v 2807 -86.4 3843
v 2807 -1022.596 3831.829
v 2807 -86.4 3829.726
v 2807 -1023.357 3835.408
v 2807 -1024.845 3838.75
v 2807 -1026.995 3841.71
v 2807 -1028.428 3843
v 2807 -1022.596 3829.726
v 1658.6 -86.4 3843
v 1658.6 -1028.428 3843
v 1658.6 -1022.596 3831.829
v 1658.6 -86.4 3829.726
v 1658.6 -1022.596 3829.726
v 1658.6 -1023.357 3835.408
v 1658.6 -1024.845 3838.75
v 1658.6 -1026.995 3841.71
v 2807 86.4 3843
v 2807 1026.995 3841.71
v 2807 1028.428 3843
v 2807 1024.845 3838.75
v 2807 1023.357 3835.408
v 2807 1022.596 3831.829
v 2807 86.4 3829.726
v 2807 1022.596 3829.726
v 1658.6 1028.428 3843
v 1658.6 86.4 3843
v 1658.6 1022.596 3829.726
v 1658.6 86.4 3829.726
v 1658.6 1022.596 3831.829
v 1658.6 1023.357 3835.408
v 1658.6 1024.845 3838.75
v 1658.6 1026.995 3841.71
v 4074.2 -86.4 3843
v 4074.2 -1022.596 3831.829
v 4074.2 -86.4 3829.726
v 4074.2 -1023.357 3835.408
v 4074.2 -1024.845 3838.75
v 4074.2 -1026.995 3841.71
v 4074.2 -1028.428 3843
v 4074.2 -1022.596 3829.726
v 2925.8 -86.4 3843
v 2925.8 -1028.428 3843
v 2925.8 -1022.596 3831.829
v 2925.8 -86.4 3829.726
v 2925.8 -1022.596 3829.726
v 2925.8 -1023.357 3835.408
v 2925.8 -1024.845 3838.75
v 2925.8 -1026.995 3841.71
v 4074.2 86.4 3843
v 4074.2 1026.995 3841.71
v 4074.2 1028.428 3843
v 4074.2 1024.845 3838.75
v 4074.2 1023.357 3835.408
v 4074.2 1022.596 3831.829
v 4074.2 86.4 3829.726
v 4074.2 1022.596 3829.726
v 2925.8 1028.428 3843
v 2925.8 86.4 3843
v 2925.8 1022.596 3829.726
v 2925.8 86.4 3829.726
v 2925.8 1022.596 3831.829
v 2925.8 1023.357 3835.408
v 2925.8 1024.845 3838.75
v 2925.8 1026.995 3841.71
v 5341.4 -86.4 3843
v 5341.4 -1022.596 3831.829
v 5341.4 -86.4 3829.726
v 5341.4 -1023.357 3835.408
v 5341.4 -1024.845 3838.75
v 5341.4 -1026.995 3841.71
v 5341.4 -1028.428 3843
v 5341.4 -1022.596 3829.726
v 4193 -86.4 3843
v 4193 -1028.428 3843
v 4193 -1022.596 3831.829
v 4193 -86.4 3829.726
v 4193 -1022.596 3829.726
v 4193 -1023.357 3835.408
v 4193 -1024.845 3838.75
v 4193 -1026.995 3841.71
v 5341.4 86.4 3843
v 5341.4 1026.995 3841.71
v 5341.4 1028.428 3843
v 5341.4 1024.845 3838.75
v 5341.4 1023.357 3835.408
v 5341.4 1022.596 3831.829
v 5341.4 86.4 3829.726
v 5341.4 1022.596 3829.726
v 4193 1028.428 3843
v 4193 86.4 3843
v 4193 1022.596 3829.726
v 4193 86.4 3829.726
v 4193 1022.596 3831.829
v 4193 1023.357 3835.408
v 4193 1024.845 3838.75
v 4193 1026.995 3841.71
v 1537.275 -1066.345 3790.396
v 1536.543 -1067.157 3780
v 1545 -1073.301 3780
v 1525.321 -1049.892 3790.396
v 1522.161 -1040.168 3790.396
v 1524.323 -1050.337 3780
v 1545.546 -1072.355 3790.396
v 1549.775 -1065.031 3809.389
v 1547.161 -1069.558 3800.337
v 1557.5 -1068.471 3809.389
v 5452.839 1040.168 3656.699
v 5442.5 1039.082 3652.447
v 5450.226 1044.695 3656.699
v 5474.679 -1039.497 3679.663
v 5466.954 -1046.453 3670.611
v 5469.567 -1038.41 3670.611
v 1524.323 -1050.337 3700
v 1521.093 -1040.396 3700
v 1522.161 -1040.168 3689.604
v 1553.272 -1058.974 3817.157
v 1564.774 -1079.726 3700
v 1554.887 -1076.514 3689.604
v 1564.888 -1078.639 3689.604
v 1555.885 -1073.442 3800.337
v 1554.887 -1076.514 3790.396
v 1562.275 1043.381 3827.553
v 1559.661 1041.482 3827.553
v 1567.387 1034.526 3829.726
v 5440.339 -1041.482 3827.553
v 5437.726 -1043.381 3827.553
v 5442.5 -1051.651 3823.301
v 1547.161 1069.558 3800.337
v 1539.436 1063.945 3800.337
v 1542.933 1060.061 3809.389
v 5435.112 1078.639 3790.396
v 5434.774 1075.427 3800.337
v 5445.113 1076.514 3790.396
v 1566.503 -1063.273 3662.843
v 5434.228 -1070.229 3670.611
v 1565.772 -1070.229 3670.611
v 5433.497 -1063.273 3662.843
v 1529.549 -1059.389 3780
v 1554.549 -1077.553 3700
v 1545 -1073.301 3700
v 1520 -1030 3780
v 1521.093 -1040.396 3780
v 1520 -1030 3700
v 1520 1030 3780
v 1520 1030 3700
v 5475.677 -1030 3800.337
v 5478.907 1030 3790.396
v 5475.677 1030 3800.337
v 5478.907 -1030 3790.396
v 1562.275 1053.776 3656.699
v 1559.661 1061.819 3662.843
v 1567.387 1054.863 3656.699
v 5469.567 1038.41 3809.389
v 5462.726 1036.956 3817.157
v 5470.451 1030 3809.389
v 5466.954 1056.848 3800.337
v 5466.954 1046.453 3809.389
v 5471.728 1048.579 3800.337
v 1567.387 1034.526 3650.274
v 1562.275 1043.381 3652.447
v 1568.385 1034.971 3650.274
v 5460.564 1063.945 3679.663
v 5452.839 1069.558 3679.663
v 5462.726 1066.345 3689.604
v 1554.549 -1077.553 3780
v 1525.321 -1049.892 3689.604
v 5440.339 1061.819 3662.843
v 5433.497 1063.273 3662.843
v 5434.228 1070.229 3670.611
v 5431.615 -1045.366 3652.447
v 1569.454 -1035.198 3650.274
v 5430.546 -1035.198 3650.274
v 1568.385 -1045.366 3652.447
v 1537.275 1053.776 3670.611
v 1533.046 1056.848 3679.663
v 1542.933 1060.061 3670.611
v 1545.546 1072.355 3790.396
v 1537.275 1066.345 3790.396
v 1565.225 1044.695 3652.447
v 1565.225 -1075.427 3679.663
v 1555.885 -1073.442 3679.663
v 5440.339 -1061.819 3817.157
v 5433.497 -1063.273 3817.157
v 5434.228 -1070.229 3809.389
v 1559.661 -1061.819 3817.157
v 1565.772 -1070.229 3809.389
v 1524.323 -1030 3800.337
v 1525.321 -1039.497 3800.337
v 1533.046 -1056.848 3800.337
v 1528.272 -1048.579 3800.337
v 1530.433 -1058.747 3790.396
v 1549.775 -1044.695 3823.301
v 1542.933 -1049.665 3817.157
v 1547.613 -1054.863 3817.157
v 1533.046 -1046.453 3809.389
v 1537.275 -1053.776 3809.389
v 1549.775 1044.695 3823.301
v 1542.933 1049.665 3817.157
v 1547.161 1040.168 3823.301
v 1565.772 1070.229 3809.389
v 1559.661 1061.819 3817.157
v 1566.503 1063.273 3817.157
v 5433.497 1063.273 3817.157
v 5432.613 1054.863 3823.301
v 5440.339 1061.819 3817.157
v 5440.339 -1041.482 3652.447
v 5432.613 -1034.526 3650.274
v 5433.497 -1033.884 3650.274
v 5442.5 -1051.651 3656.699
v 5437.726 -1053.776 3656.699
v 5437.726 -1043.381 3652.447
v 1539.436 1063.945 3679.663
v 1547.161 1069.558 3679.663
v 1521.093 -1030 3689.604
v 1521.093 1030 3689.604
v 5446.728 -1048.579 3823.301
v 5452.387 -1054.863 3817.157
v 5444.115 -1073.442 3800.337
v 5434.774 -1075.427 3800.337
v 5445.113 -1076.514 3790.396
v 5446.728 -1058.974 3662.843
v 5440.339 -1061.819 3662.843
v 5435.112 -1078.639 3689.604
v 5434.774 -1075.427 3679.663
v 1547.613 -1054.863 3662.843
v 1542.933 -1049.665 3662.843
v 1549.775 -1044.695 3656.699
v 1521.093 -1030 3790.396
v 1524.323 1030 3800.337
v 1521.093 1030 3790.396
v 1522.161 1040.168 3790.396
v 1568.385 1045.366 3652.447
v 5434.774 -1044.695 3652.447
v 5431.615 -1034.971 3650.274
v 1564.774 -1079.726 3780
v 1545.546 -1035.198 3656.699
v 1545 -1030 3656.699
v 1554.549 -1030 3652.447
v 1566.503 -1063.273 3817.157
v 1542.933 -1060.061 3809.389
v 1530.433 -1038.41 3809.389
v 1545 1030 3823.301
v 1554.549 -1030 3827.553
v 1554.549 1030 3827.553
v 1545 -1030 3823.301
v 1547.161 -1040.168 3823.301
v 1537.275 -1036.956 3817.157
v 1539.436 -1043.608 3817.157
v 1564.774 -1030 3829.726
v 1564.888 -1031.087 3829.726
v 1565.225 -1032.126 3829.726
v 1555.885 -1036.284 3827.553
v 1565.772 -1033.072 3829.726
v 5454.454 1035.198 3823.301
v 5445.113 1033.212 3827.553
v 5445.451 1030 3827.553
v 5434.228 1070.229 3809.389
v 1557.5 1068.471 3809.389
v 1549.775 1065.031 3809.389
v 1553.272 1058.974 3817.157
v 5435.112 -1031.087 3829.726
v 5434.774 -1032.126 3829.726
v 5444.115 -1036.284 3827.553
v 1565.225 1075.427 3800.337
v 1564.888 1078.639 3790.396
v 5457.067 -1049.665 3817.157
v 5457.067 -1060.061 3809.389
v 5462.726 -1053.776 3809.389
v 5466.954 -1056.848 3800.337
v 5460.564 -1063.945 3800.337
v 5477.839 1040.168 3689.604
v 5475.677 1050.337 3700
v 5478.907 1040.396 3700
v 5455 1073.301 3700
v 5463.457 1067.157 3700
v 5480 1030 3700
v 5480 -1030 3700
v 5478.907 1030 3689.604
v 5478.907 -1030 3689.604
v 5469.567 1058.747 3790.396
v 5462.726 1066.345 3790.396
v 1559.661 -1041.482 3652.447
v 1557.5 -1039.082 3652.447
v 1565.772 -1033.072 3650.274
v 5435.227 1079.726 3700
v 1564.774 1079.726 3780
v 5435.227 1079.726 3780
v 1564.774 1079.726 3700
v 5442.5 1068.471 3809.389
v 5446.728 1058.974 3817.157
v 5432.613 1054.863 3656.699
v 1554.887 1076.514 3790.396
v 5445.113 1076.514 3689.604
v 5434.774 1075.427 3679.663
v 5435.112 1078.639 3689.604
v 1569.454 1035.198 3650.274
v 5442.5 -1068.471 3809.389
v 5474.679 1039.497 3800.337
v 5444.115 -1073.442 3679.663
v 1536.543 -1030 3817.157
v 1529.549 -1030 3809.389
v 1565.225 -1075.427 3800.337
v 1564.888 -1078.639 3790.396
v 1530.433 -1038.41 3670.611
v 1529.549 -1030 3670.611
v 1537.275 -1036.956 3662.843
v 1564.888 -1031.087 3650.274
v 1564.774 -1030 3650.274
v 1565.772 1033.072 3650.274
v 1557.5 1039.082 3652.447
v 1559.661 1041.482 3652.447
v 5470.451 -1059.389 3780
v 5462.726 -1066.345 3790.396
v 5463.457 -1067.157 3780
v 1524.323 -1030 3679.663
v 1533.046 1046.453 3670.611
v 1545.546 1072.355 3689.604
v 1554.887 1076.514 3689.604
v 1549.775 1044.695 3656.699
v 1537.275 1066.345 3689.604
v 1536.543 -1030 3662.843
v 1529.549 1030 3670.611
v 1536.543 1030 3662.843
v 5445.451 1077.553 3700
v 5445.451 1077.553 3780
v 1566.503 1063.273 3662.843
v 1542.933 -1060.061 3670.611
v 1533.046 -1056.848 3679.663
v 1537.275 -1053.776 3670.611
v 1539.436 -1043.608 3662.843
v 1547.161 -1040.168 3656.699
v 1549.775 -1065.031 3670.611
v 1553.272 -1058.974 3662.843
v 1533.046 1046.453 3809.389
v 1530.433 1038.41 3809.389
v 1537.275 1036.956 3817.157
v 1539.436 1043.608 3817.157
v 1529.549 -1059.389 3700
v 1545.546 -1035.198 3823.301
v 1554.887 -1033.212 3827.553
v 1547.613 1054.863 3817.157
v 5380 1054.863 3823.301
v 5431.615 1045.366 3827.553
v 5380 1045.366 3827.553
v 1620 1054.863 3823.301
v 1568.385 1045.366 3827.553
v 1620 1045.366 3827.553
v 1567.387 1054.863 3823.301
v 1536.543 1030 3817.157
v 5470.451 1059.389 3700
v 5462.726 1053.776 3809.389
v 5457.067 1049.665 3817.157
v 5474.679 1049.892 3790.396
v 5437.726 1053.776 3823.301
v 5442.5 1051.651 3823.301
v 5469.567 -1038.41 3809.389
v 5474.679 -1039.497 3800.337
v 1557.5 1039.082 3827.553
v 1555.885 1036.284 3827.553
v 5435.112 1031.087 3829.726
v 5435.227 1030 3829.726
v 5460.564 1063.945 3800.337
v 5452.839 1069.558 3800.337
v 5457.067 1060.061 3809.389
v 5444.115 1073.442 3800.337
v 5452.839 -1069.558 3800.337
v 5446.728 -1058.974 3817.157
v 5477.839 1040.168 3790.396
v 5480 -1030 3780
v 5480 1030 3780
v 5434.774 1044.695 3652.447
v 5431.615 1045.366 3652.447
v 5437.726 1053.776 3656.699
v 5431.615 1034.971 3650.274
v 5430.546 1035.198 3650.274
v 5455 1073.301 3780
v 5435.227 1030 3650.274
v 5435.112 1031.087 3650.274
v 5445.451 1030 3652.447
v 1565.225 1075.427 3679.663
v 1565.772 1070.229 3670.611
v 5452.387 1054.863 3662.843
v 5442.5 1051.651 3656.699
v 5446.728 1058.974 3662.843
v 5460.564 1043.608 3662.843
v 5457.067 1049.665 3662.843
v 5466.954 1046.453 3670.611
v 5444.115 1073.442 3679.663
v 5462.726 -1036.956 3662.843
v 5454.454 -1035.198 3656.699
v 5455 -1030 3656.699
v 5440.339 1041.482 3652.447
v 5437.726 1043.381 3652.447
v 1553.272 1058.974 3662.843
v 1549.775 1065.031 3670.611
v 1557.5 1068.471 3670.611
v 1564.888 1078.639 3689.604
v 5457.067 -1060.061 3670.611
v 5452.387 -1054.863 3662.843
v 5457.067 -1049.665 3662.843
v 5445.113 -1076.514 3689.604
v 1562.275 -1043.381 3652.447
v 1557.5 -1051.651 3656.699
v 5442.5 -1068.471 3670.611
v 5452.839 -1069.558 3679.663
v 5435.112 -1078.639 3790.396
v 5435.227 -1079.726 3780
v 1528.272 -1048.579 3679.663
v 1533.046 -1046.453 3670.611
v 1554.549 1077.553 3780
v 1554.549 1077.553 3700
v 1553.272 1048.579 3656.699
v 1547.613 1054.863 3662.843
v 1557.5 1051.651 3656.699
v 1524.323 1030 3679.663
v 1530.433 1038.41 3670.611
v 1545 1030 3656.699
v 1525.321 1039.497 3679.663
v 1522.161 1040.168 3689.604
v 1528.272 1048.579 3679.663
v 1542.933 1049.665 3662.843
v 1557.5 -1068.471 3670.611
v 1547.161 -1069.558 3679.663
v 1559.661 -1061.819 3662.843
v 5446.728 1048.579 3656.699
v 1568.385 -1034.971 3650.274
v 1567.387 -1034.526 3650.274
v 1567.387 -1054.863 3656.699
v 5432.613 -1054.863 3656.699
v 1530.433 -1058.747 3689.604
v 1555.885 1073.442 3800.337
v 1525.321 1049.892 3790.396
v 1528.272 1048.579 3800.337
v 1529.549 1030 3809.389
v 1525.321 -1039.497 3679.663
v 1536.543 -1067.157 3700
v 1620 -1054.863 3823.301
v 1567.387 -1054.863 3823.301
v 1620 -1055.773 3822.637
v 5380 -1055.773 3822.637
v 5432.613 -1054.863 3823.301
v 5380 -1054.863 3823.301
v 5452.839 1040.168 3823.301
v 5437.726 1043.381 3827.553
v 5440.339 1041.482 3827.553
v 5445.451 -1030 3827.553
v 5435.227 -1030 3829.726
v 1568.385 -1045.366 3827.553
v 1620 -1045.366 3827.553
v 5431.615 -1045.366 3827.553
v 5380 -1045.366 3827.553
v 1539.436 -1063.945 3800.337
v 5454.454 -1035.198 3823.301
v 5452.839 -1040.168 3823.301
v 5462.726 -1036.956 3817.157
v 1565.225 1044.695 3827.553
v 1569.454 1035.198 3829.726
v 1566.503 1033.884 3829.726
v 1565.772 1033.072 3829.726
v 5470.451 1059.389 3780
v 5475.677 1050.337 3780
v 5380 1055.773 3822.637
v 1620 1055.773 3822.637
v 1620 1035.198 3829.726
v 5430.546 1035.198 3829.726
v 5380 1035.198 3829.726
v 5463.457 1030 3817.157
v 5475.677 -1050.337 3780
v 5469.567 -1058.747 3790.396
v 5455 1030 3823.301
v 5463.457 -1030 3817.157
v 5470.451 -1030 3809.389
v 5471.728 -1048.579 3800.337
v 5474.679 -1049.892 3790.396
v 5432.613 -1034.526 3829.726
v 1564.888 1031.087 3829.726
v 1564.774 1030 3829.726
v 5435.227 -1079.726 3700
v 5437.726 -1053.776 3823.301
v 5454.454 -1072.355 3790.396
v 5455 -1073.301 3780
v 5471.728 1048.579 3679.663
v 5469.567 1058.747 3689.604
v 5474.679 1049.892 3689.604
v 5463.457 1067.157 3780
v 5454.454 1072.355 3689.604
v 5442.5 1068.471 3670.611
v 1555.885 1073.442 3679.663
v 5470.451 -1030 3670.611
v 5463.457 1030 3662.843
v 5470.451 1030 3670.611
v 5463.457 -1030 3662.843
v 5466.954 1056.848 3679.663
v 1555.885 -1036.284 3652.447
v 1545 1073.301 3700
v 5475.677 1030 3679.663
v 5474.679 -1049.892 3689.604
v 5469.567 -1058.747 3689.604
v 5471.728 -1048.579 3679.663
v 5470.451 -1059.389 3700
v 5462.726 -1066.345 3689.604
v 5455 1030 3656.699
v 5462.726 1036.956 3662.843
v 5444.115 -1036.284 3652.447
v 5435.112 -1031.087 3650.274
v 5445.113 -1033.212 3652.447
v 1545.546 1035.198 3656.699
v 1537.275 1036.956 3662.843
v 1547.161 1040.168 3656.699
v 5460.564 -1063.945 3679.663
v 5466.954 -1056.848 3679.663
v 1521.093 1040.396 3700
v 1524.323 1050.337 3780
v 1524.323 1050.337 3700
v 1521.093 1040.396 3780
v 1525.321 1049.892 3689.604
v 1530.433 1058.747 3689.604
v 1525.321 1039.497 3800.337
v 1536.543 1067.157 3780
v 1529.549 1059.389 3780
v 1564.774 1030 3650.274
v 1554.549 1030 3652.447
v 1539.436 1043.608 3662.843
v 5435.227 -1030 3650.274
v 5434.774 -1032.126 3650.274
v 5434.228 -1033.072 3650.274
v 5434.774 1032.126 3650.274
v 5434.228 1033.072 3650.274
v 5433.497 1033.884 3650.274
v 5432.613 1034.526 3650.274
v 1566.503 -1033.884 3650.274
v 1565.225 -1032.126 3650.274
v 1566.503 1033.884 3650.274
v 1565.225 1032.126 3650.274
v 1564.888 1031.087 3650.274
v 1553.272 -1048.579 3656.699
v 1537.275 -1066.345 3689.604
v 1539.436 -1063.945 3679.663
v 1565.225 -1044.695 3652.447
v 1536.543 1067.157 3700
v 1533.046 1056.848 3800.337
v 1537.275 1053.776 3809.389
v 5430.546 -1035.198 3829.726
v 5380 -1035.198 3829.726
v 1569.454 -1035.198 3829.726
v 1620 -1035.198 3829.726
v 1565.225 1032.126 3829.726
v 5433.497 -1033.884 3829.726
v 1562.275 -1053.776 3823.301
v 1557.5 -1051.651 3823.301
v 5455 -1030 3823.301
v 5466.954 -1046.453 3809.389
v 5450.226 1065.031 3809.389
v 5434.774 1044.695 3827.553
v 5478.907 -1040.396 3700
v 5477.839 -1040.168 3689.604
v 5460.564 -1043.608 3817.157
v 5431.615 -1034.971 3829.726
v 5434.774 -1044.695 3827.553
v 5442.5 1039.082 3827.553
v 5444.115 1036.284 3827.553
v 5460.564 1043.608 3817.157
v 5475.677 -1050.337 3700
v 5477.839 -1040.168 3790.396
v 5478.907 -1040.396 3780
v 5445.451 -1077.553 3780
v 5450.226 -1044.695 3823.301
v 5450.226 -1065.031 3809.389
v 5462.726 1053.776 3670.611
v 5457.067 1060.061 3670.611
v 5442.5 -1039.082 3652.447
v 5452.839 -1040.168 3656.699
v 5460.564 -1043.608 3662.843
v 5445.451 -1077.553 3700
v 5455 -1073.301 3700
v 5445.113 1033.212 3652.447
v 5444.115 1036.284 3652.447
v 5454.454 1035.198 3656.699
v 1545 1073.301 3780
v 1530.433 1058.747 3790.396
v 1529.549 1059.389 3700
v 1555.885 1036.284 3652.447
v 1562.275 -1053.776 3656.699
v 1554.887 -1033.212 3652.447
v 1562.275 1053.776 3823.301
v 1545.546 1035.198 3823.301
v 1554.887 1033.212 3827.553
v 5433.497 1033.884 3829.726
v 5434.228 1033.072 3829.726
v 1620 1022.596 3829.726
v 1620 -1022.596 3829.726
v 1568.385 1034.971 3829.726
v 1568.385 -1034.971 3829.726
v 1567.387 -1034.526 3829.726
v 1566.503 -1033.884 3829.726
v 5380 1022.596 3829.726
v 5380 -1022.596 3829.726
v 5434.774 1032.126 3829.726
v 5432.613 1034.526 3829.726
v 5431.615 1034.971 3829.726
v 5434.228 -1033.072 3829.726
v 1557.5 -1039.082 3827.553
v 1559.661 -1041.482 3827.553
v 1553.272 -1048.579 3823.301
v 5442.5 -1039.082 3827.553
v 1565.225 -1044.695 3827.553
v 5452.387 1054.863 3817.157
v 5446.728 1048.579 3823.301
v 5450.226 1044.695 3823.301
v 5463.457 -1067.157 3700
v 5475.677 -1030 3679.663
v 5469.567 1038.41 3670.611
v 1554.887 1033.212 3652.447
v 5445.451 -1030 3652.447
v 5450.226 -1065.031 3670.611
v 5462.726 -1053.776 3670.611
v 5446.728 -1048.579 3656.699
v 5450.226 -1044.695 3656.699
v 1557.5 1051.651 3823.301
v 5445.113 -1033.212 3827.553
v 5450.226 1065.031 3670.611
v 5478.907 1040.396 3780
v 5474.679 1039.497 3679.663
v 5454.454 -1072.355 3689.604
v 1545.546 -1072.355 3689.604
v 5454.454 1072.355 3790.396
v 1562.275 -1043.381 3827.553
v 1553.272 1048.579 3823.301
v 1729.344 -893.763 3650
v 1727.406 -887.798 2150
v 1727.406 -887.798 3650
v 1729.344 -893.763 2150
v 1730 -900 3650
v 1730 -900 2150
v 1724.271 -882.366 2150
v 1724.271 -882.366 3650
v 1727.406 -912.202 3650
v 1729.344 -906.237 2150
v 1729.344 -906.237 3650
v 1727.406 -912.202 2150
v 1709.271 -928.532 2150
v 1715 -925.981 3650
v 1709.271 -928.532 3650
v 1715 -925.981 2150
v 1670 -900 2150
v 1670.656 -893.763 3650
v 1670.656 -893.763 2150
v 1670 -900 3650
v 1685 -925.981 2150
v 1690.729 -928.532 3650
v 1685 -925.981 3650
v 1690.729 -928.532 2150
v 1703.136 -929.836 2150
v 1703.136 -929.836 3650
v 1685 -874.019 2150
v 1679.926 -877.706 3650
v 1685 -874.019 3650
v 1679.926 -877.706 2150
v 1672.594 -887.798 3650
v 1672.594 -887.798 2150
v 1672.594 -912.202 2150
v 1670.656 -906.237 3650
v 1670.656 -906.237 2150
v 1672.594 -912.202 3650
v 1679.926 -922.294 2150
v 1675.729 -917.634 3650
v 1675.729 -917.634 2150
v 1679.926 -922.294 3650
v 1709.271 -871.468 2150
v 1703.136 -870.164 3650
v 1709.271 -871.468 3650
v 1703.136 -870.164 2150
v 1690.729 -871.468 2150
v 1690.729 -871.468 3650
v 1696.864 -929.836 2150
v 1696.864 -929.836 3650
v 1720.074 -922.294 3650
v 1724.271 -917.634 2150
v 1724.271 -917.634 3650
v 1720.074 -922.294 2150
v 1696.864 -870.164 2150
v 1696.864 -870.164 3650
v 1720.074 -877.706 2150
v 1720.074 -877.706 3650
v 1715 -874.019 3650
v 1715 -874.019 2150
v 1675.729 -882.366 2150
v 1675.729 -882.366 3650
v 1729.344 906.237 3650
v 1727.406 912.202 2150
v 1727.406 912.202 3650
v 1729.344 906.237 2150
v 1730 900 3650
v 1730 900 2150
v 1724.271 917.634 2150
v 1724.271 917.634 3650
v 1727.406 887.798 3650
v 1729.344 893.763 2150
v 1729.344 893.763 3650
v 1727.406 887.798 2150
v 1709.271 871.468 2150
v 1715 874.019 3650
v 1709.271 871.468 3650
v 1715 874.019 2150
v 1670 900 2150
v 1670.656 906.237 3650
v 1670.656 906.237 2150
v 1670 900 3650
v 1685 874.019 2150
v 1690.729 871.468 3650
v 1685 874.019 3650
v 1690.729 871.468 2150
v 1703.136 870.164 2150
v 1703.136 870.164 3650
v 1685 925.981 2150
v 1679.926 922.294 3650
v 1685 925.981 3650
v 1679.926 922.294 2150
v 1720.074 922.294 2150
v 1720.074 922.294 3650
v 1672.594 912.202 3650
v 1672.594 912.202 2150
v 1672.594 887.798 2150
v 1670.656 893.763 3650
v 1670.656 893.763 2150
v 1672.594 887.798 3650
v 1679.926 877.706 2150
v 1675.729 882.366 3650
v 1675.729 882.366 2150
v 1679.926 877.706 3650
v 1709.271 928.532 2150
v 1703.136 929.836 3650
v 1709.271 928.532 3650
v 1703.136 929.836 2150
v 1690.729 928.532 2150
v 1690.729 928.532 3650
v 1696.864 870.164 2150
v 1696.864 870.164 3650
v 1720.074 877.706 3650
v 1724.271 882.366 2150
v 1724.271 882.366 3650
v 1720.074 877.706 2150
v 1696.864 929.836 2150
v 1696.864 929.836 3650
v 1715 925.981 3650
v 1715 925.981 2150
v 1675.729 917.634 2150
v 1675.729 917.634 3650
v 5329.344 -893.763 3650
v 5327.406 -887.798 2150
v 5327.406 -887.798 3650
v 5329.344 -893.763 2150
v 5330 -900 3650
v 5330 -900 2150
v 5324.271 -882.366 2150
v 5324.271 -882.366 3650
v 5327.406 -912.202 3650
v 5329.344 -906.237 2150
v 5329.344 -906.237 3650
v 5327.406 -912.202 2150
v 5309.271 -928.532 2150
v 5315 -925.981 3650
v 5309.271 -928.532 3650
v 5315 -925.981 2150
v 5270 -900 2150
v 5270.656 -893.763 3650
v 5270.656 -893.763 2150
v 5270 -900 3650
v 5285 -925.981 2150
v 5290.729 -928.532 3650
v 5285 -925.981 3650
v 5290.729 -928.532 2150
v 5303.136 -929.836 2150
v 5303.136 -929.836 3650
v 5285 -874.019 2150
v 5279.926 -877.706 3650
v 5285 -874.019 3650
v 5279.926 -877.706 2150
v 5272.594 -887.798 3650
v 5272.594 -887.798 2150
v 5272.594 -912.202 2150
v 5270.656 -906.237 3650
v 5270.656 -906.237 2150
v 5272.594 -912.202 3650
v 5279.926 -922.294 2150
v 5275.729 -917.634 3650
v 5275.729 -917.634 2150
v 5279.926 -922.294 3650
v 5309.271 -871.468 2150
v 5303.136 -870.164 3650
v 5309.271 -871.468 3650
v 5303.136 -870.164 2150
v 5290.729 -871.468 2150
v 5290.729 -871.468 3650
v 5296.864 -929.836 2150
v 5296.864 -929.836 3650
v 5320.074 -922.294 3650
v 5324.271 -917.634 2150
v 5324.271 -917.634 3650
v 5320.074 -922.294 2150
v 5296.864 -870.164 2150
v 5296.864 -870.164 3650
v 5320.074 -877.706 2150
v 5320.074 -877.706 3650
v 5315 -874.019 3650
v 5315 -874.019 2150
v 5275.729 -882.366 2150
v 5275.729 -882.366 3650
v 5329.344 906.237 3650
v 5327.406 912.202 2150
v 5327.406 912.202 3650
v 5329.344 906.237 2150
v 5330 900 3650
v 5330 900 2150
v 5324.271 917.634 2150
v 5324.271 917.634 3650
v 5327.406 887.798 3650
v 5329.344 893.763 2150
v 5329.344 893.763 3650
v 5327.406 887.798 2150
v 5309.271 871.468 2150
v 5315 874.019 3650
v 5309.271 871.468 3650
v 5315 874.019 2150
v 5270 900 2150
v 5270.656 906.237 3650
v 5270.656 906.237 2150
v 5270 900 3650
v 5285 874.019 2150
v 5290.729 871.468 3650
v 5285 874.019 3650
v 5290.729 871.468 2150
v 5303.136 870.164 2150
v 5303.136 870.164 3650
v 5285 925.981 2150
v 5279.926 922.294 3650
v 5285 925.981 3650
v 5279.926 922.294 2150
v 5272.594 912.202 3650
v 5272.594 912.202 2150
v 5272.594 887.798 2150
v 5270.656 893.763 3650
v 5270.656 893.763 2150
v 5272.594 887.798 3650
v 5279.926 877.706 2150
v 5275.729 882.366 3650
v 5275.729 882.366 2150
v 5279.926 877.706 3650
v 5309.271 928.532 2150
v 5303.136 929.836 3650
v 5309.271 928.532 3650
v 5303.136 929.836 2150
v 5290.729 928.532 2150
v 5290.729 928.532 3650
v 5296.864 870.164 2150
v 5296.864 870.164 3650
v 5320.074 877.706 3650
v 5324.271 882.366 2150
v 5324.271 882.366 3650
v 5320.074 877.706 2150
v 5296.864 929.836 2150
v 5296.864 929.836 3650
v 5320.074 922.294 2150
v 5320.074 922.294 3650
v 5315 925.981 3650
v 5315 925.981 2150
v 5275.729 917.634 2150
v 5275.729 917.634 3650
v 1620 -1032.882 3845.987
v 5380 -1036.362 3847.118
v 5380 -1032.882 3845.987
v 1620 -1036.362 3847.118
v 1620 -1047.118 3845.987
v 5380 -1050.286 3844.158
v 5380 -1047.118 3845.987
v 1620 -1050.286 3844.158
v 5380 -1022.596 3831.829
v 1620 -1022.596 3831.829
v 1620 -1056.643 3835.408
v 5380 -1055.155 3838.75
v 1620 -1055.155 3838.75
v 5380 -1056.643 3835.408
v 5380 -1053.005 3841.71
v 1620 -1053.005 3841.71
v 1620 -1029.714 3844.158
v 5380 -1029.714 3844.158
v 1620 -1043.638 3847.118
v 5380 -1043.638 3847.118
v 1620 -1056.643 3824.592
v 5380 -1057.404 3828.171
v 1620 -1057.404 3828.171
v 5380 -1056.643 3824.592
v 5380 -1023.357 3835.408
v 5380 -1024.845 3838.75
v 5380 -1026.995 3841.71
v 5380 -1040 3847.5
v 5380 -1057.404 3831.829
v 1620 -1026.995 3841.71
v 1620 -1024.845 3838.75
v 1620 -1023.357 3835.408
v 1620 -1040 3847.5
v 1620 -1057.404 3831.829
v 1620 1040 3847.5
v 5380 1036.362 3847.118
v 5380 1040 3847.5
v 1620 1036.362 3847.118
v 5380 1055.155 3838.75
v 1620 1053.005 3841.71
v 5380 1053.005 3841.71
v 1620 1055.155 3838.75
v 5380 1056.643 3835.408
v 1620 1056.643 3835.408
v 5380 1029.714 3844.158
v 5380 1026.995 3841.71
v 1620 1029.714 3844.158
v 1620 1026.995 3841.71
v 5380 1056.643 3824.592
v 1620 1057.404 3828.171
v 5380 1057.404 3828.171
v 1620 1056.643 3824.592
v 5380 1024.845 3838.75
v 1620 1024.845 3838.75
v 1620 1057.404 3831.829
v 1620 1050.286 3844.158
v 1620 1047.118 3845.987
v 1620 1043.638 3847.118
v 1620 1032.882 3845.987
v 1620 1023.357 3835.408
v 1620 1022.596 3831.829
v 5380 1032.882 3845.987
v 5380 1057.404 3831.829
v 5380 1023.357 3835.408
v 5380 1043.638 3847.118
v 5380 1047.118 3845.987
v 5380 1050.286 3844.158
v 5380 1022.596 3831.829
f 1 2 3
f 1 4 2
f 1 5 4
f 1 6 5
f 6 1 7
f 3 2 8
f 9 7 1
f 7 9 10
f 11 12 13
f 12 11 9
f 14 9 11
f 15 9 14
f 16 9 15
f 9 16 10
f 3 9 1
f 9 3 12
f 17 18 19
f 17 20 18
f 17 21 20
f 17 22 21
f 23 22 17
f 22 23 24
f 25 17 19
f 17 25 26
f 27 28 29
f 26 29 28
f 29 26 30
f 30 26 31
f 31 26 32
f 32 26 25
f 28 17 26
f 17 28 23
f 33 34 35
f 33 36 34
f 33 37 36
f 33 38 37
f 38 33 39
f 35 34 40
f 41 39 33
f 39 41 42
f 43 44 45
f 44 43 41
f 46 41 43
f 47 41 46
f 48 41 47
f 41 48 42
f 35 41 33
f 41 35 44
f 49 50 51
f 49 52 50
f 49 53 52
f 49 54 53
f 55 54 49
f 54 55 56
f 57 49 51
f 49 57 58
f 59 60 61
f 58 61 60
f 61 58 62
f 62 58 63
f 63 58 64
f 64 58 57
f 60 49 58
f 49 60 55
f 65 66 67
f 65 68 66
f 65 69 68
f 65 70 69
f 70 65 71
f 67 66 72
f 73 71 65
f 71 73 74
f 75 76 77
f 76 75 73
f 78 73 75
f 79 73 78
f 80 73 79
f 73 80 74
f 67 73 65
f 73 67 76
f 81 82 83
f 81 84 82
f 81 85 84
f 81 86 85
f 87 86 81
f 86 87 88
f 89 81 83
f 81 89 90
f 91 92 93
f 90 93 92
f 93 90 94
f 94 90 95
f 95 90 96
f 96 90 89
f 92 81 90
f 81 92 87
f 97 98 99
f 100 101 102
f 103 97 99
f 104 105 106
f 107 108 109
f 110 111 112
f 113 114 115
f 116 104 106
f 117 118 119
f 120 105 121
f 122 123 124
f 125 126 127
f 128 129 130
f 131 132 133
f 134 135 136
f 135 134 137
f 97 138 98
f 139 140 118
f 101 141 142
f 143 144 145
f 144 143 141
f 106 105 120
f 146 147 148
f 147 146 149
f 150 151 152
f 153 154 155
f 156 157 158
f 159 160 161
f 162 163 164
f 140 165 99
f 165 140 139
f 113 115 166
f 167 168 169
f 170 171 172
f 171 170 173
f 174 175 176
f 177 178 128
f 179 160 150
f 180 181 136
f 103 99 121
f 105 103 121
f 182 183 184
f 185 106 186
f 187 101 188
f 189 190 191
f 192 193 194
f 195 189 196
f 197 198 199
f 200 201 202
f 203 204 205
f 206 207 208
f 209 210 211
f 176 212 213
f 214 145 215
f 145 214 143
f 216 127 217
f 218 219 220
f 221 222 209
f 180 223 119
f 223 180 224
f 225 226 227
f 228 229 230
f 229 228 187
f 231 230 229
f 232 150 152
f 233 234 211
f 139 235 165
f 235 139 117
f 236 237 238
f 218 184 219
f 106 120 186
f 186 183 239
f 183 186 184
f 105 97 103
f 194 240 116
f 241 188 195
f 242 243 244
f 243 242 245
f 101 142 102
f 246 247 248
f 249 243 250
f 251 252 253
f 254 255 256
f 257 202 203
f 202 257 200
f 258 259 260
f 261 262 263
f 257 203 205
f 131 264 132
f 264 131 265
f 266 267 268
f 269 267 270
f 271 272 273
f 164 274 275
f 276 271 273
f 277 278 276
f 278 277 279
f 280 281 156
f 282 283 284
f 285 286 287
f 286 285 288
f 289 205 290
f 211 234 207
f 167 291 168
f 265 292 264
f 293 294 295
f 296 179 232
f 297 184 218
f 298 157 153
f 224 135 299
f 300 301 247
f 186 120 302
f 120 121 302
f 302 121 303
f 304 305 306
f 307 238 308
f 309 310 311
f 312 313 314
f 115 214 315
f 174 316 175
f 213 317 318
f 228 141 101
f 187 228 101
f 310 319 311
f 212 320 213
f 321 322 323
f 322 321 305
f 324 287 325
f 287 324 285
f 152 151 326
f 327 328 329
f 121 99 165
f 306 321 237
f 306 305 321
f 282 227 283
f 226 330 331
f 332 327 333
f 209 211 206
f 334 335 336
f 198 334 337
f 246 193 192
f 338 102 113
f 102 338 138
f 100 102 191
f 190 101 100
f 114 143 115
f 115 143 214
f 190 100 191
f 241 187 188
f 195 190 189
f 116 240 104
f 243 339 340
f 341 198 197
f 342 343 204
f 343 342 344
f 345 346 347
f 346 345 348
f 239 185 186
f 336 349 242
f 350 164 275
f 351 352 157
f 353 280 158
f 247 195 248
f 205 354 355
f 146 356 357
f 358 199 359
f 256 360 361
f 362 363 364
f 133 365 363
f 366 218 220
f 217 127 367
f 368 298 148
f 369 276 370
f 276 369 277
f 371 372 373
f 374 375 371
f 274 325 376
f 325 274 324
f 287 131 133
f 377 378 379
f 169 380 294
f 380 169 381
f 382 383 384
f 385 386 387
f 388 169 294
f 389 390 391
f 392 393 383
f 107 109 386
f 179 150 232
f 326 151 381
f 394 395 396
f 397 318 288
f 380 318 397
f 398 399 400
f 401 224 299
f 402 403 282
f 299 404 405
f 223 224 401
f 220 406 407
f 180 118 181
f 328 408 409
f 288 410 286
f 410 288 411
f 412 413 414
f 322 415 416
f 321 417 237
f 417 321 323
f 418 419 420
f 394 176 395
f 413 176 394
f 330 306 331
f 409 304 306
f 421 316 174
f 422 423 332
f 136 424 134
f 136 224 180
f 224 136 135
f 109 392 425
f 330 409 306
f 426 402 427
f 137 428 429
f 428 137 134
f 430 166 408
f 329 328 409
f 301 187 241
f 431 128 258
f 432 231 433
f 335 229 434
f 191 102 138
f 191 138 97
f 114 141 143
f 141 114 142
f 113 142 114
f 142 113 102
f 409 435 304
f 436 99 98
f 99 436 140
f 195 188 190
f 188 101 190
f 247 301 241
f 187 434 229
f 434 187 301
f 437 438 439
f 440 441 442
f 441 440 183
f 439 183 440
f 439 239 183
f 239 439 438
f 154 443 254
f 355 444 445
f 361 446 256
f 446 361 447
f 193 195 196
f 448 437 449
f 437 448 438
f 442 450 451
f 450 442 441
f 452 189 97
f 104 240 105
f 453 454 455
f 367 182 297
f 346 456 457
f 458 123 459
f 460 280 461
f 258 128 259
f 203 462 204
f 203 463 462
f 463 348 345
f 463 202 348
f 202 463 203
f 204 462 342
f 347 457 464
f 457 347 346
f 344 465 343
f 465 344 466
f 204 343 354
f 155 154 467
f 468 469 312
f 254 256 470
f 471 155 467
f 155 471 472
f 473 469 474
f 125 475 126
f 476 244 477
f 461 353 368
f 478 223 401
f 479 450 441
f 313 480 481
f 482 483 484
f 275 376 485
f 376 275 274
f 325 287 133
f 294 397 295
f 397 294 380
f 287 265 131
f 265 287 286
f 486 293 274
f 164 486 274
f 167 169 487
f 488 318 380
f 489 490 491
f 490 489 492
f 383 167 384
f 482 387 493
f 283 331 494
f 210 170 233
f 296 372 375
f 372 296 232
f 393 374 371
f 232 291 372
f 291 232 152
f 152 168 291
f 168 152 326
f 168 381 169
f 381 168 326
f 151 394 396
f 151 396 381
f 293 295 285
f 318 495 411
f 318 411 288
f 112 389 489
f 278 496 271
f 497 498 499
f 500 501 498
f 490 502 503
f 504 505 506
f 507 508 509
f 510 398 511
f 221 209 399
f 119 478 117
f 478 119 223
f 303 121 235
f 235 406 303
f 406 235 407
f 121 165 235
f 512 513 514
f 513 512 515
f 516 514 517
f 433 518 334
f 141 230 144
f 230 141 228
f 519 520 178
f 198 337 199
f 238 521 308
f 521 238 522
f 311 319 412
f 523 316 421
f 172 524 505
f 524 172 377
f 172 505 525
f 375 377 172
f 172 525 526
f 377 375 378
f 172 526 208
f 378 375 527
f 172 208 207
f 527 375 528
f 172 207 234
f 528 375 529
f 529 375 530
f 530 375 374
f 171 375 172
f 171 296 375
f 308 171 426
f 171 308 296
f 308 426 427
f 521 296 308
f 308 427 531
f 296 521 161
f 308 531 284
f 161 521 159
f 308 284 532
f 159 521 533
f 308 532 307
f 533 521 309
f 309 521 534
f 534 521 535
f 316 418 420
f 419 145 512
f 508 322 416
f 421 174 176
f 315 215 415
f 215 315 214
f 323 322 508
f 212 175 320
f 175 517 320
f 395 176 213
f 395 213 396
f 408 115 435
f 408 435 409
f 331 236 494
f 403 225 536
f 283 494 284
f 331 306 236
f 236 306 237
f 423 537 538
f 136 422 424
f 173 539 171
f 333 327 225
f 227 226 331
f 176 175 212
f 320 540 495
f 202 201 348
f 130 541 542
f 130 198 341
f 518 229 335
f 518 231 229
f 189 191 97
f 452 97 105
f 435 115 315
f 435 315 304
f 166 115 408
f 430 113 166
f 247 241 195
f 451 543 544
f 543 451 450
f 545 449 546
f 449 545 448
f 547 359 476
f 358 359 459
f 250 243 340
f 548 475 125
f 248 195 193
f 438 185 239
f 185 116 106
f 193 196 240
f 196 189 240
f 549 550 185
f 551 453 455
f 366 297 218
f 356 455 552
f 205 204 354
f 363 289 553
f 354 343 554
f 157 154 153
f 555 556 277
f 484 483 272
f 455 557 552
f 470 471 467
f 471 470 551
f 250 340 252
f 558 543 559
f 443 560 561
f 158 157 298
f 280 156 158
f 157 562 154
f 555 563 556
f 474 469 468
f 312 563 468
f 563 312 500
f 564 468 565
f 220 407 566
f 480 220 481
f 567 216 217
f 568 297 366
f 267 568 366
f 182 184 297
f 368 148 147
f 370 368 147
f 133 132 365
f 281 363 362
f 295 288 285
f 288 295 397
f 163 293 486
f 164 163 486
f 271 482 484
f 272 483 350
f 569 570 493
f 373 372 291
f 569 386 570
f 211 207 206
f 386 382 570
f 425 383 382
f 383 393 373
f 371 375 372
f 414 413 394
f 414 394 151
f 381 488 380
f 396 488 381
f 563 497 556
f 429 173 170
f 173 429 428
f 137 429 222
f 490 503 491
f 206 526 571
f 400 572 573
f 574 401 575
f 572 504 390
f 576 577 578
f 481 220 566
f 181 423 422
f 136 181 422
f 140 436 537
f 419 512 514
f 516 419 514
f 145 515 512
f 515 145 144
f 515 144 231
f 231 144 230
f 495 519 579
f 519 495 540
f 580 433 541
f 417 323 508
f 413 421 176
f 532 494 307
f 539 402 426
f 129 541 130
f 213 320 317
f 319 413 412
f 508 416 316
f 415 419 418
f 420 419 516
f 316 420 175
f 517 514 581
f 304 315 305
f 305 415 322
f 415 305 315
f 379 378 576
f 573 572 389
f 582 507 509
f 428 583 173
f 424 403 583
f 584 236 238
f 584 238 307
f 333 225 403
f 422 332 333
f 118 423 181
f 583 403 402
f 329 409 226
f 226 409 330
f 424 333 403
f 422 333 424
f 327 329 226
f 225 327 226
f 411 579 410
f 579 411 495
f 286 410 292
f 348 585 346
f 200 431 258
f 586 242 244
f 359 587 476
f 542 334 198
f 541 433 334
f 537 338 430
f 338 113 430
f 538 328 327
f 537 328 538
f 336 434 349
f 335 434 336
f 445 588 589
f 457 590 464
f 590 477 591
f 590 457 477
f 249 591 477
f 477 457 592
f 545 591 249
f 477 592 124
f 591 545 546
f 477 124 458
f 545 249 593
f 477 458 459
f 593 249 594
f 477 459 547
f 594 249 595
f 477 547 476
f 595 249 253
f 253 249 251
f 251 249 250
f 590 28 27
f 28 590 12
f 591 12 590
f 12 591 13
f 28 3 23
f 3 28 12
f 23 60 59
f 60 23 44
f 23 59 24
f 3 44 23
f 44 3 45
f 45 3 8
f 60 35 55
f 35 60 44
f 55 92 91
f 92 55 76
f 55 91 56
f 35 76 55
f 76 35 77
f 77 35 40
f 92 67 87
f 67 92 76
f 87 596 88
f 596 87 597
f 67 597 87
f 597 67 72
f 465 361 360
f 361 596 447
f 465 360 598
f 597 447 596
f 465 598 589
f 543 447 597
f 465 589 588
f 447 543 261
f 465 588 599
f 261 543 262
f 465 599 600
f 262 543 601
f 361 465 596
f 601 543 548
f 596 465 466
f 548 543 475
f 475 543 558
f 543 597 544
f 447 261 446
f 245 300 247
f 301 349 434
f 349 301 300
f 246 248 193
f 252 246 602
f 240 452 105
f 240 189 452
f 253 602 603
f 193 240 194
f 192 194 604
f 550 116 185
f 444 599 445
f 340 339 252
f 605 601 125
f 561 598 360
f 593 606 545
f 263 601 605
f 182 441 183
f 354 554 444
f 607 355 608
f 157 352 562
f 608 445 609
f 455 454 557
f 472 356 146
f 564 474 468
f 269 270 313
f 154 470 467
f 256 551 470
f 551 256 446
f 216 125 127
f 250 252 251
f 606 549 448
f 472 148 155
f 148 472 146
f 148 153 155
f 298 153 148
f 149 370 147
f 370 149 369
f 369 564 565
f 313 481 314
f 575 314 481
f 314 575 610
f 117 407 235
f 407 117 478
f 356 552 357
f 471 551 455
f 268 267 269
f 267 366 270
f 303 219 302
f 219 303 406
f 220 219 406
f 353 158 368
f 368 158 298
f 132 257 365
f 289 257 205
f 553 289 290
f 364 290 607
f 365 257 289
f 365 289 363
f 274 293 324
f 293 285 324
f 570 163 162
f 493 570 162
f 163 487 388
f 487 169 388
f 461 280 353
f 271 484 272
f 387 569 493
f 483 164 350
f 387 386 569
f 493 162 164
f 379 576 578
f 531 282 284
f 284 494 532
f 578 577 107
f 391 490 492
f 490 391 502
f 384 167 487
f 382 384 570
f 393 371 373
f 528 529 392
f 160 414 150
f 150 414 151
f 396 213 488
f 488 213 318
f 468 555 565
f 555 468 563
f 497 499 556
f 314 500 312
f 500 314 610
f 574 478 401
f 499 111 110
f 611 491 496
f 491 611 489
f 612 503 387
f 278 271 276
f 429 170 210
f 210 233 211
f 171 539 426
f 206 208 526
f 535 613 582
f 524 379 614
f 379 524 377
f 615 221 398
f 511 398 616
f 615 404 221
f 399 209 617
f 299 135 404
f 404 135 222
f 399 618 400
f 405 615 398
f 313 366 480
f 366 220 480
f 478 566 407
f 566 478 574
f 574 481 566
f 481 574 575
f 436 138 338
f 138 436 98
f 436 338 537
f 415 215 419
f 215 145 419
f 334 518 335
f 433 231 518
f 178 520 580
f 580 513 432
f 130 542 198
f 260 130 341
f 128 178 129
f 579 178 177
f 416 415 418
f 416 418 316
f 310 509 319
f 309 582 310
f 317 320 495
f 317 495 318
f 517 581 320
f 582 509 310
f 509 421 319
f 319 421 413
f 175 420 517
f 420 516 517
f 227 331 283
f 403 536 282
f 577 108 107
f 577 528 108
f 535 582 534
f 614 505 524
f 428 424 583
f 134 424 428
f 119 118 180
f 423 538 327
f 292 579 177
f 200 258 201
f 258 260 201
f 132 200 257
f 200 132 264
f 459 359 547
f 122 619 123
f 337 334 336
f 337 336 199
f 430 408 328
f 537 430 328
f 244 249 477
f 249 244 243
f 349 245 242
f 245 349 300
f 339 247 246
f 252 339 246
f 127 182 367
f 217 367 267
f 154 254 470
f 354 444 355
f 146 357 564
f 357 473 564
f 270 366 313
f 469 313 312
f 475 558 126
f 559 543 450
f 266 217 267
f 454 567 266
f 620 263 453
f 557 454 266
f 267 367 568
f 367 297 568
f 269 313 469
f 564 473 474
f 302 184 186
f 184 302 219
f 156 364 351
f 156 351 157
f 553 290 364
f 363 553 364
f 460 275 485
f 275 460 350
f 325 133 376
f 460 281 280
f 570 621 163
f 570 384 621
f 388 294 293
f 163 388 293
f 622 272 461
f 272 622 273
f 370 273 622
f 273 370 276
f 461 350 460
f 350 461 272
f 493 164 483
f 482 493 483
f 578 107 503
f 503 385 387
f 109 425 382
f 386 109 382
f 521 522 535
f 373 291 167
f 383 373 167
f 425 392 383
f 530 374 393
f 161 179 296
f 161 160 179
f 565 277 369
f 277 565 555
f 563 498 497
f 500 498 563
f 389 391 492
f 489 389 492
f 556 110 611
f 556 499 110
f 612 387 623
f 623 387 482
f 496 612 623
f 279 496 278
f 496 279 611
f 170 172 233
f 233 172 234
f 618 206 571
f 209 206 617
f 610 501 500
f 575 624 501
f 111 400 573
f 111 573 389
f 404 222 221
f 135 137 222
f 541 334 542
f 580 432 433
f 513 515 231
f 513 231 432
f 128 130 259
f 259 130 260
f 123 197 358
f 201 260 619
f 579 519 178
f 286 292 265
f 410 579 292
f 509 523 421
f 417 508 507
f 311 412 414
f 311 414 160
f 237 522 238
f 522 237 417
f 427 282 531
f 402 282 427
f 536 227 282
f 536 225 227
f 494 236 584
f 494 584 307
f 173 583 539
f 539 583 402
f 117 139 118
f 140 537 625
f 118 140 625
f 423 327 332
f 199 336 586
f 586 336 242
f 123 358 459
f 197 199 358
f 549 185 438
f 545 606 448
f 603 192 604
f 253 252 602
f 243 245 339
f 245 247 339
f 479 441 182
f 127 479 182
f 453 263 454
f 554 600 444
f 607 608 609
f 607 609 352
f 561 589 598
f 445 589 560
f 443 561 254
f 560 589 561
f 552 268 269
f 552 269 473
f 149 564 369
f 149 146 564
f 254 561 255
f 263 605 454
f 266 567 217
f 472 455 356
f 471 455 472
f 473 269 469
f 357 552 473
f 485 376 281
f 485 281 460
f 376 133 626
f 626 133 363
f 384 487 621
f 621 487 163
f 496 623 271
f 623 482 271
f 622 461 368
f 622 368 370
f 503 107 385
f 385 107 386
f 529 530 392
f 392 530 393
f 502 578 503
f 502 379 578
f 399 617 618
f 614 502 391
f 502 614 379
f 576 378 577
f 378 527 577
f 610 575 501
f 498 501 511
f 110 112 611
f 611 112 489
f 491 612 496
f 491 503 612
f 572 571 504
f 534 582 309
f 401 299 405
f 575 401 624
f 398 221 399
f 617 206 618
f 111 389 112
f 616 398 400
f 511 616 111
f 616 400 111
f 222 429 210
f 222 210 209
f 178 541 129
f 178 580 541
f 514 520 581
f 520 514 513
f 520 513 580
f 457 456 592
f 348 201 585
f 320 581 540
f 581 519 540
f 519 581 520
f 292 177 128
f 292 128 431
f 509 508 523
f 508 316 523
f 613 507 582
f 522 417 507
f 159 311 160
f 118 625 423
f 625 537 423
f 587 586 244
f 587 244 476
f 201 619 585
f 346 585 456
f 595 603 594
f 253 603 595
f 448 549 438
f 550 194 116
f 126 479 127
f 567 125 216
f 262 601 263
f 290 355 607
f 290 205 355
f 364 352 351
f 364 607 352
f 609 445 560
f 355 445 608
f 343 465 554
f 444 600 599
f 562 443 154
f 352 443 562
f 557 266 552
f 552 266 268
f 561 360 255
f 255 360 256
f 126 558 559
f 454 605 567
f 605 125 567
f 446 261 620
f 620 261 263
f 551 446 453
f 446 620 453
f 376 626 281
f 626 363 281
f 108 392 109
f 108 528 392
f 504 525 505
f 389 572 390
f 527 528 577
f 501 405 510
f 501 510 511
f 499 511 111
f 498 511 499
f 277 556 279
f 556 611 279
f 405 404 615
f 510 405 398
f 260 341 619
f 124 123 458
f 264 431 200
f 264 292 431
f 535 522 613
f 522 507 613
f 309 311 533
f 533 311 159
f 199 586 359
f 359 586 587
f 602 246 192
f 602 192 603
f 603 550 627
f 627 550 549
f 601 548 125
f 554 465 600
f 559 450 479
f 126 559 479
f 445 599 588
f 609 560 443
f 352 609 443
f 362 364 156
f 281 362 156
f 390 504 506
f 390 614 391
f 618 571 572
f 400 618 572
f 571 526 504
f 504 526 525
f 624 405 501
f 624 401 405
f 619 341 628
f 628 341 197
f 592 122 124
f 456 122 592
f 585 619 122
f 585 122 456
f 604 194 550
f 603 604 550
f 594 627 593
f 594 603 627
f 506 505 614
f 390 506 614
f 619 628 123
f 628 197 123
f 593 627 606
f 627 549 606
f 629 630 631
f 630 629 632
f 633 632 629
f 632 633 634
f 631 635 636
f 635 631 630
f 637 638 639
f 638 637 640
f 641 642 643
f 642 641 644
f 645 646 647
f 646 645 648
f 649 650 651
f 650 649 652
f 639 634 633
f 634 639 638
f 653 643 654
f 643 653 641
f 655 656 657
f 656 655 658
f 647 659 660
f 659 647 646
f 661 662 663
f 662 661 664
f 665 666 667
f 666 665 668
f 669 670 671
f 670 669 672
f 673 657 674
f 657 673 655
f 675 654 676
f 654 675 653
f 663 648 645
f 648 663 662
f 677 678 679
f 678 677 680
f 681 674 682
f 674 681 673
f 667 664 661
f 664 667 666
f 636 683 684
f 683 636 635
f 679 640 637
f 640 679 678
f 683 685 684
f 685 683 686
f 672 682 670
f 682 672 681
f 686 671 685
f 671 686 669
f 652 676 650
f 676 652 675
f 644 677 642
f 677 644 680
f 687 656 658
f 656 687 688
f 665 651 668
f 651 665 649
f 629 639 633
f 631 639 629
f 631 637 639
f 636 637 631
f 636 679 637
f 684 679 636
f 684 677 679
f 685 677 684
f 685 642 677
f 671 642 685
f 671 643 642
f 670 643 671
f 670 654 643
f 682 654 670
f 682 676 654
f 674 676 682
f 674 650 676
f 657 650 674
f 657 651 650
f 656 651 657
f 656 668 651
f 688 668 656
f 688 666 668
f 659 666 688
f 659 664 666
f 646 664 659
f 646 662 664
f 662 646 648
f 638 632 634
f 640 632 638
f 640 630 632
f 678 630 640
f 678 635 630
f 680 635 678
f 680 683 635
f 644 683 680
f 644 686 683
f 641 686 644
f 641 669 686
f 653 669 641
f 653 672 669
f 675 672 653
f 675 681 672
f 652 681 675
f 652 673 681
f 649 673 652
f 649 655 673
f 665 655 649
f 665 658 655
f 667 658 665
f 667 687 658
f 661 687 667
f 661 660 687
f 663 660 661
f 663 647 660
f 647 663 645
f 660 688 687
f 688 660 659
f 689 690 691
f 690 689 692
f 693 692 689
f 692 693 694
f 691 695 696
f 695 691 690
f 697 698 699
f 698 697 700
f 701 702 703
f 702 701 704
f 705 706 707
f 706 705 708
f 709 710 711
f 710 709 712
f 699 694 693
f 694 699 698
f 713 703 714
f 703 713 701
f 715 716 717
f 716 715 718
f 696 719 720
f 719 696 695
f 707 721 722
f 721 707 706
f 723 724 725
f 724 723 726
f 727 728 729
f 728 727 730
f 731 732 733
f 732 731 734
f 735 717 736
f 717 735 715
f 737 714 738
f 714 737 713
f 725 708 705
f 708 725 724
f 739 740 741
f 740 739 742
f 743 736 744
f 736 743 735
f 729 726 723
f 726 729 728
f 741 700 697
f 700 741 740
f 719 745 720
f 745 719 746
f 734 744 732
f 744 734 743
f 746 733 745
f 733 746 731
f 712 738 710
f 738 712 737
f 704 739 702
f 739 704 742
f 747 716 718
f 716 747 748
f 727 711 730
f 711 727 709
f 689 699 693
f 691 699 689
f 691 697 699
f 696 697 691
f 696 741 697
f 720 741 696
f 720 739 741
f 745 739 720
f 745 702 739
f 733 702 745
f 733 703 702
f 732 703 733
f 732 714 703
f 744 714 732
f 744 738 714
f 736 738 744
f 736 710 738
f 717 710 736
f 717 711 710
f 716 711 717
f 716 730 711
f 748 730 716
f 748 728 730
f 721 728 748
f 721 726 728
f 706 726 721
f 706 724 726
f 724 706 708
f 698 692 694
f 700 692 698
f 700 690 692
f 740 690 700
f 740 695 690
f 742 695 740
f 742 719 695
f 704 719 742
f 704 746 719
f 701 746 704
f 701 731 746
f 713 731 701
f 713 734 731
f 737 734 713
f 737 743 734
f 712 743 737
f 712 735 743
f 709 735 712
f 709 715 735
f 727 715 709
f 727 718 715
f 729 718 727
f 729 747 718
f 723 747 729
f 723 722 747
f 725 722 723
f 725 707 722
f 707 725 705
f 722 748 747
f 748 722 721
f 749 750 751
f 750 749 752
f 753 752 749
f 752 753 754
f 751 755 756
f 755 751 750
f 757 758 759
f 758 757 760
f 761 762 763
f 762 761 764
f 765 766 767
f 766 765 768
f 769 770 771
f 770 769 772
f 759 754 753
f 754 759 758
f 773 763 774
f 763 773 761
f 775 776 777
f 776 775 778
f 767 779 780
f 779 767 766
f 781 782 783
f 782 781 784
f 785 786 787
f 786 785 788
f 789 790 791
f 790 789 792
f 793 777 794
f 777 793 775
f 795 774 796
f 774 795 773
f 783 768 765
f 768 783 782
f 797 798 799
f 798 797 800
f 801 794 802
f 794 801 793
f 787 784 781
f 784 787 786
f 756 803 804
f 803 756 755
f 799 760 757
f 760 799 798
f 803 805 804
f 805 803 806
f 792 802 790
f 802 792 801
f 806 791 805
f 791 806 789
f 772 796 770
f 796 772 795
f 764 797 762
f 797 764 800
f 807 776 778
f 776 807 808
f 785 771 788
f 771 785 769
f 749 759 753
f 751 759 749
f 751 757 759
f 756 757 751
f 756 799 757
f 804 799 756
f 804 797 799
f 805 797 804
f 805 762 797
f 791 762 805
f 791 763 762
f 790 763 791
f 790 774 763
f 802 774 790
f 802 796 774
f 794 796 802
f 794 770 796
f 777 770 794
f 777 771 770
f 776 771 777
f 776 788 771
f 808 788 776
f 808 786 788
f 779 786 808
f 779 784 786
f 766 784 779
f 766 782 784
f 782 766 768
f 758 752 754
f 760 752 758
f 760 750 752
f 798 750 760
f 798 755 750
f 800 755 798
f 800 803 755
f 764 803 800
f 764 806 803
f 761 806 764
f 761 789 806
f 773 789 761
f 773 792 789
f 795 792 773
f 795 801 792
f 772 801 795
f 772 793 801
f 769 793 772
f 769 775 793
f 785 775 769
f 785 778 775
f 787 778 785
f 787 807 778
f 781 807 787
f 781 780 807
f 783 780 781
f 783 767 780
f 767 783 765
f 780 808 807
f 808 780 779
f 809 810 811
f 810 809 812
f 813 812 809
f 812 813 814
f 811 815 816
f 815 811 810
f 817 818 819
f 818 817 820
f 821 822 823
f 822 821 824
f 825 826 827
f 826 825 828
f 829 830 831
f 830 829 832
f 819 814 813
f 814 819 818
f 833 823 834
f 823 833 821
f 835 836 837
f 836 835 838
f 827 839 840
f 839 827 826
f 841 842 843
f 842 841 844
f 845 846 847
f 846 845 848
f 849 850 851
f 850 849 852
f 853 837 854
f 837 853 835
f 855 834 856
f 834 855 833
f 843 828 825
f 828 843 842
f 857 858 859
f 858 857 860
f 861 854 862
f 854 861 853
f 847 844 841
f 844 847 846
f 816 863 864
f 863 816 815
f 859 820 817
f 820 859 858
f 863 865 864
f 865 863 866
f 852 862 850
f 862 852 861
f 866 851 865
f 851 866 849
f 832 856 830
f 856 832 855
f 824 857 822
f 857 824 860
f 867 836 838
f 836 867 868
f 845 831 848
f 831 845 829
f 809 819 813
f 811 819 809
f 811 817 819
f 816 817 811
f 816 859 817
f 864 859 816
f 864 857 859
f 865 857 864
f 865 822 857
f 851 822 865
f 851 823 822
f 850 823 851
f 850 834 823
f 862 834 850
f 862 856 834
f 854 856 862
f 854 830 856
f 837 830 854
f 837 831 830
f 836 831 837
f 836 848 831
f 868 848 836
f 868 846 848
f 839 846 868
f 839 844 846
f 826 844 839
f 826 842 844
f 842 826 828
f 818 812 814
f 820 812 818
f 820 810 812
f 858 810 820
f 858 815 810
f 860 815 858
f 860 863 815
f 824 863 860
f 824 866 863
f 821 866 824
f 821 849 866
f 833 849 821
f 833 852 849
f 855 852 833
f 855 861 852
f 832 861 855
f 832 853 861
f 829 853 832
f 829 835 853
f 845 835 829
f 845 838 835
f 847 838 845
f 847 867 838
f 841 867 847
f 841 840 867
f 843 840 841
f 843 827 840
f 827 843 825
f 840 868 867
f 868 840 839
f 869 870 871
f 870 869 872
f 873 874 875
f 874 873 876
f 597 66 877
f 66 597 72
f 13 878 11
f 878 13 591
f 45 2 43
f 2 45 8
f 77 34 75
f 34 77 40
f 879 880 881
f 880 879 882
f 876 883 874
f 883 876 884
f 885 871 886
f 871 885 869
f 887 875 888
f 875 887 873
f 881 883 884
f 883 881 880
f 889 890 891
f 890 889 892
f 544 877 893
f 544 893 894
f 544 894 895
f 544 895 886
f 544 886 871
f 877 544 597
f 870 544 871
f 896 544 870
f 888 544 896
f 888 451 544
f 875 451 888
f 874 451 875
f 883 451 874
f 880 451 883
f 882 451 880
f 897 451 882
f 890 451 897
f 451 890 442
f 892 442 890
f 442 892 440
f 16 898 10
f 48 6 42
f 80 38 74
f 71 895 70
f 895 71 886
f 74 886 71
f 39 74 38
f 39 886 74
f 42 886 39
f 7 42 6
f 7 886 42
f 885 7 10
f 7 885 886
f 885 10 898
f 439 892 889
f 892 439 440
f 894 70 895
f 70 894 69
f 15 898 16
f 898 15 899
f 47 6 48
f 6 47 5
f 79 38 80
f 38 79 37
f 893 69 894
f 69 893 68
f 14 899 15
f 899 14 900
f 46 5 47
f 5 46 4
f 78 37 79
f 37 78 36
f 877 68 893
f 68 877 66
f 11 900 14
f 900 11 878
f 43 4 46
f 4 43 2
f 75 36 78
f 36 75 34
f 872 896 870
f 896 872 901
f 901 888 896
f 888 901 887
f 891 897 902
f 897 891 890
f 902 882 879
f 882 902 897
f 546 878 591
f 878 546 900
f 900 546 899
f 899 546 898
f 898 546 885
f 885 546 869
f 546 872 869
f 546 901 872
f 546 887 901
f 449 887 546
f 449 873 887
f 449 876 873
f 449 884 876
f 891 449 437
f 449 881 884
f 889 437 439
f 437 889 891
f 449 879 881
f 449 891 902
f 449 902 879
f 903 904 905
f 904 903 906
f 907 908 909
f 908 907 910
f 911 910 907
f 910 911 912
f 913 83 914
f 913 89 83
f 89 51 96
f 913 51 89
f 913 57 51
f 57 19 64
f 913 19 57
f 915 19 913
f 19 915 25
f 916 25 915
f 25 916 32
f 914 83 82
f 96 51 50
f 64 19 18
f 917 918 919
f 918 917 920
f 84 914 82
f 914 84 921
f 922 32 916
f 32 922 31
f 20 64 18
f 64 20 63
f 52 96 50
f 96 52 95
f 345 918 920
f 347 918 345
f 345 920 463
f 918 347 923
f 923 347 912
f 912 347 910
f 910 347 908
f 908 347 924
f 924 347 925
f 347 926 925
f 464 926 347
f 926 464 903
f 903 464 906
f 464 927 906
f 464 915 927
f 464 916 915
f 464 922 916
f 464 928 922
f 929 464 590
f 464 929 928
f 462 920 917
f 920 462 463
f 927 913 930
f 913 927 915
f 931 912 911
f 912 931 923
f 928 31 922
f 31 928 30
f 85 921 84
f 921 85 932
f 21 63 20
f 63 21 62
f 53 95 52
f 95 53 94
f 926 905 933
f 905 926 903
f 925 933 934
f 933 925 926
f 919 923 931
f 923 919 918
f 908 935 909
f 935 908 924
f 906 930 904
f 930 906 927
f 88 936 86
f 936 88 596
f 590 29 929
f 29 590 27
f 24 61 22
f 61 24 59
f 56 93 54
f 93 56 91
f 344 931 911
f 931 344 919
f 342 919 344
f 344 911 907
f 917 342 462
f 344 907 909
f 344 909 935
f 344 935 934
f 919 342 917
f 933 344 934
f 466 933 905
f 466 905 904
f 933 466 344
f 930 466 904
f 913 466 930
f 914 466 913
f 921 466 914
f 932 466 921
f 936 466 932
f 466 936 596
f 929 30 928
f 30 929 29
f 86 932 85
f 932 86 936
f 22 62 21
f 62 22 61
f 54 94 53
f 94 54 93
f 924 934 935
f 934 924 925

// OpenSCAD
// file: ../lib/shapes.scad
// shapes.scad — small geometry helpers

// box with rounded corners, centered
module rounded_box(size, r = 40) {
  hull()
    for (x = [-size[0]/2 + r, size[0]/2 - r],
         y = [-size[1]/2 + r, size[1]/2 - r],
         z = [-size[2]/2 + r, size[2]/2 - r])
      translate([x, y, z]) sphere(r = r);
}

// rod between two points
module rod(p1, p2, d) {
  hull() {
    translate(p1) sphere(d = d);
    translate(p2) sphere(d = d);
  }
}

// symmetric NACA-4-digit-ish foil section, chord along +x, LE at origin
function naca_half(c, t, n) =
  [ for (i = [0 : n])
      let (u = i / n,
           yt = 5 * t * c * (0.2969 * sqrt(u) - 0.1260 * u
                - 0.3516 * u * u + 0.2843 * u * u * u
                - 0.1015 * u * u * u * u))
      [u * c, yt] ];

function foil_pts(c, t = 0.12, n = 24) =
  concat(naca_half(c, t, n),
         [ for (i = [n - 1 : -1 : 1])
             let (p = naca_half(c, t, n)[i]) [p[0], -p[1]] ]);
// main file
// canopy.scad — pop-top solar canopy, 4 actuators, lift 0..canopy_lift
include <../params.scad>
use <../lib/shapes.scad>

module canopy(lift = 0) {
  cl = cabin_x1 - cabin_x0 + 2 * canopy_overhang;
  cw = cabin_w + 2 * canopy_overhang;
  cx = (cabin_x0 + cabin_x1) / 2;
  // canopy slab
  translate([cx, 0, cabin_roof_z + lift + canopy_thick / 2]) {
    color("whitesmoke")
      rounded_box([cl, cw, canopy_thick], r = 50);
    // solar panels, 2 x 3 grid
    color("midnightblue")
      for (i = [0 : 2], j = [-1, 1])
        translate([(i - 1) * cl * 0.32, j * cw * 0.26,
                   canopy_thick / 2 + 6])
          cube([cl * 0.29, cw * 0.44, 14], center = true);
  }
  // 4 actuators from roof corners
  if (lift > 1)
    color("silver")
      for (sx = [-1, 1], sy = [-1, 1])
        translate([cx + sx * (cl / 2 - 180), sy * (cw / 2 - 180),
                   cabin_roof_z])
          cylinder(h = lift, d = 60);
  // guardrail when raised (terrace mode)
  if (lift > canopy_lift * 0.9)
    color("silver")
      for (sy = [-1, 1])
        translate([cx, sy * (cw / 2 - 40),
                   cabin_roof_z + lift + canopy_thick])
          rotate([0, 90, 0])
            cylinder(h = cl - 200, d = 35, center = true);
}

canopy(canopy_lift);   // demo: raised
